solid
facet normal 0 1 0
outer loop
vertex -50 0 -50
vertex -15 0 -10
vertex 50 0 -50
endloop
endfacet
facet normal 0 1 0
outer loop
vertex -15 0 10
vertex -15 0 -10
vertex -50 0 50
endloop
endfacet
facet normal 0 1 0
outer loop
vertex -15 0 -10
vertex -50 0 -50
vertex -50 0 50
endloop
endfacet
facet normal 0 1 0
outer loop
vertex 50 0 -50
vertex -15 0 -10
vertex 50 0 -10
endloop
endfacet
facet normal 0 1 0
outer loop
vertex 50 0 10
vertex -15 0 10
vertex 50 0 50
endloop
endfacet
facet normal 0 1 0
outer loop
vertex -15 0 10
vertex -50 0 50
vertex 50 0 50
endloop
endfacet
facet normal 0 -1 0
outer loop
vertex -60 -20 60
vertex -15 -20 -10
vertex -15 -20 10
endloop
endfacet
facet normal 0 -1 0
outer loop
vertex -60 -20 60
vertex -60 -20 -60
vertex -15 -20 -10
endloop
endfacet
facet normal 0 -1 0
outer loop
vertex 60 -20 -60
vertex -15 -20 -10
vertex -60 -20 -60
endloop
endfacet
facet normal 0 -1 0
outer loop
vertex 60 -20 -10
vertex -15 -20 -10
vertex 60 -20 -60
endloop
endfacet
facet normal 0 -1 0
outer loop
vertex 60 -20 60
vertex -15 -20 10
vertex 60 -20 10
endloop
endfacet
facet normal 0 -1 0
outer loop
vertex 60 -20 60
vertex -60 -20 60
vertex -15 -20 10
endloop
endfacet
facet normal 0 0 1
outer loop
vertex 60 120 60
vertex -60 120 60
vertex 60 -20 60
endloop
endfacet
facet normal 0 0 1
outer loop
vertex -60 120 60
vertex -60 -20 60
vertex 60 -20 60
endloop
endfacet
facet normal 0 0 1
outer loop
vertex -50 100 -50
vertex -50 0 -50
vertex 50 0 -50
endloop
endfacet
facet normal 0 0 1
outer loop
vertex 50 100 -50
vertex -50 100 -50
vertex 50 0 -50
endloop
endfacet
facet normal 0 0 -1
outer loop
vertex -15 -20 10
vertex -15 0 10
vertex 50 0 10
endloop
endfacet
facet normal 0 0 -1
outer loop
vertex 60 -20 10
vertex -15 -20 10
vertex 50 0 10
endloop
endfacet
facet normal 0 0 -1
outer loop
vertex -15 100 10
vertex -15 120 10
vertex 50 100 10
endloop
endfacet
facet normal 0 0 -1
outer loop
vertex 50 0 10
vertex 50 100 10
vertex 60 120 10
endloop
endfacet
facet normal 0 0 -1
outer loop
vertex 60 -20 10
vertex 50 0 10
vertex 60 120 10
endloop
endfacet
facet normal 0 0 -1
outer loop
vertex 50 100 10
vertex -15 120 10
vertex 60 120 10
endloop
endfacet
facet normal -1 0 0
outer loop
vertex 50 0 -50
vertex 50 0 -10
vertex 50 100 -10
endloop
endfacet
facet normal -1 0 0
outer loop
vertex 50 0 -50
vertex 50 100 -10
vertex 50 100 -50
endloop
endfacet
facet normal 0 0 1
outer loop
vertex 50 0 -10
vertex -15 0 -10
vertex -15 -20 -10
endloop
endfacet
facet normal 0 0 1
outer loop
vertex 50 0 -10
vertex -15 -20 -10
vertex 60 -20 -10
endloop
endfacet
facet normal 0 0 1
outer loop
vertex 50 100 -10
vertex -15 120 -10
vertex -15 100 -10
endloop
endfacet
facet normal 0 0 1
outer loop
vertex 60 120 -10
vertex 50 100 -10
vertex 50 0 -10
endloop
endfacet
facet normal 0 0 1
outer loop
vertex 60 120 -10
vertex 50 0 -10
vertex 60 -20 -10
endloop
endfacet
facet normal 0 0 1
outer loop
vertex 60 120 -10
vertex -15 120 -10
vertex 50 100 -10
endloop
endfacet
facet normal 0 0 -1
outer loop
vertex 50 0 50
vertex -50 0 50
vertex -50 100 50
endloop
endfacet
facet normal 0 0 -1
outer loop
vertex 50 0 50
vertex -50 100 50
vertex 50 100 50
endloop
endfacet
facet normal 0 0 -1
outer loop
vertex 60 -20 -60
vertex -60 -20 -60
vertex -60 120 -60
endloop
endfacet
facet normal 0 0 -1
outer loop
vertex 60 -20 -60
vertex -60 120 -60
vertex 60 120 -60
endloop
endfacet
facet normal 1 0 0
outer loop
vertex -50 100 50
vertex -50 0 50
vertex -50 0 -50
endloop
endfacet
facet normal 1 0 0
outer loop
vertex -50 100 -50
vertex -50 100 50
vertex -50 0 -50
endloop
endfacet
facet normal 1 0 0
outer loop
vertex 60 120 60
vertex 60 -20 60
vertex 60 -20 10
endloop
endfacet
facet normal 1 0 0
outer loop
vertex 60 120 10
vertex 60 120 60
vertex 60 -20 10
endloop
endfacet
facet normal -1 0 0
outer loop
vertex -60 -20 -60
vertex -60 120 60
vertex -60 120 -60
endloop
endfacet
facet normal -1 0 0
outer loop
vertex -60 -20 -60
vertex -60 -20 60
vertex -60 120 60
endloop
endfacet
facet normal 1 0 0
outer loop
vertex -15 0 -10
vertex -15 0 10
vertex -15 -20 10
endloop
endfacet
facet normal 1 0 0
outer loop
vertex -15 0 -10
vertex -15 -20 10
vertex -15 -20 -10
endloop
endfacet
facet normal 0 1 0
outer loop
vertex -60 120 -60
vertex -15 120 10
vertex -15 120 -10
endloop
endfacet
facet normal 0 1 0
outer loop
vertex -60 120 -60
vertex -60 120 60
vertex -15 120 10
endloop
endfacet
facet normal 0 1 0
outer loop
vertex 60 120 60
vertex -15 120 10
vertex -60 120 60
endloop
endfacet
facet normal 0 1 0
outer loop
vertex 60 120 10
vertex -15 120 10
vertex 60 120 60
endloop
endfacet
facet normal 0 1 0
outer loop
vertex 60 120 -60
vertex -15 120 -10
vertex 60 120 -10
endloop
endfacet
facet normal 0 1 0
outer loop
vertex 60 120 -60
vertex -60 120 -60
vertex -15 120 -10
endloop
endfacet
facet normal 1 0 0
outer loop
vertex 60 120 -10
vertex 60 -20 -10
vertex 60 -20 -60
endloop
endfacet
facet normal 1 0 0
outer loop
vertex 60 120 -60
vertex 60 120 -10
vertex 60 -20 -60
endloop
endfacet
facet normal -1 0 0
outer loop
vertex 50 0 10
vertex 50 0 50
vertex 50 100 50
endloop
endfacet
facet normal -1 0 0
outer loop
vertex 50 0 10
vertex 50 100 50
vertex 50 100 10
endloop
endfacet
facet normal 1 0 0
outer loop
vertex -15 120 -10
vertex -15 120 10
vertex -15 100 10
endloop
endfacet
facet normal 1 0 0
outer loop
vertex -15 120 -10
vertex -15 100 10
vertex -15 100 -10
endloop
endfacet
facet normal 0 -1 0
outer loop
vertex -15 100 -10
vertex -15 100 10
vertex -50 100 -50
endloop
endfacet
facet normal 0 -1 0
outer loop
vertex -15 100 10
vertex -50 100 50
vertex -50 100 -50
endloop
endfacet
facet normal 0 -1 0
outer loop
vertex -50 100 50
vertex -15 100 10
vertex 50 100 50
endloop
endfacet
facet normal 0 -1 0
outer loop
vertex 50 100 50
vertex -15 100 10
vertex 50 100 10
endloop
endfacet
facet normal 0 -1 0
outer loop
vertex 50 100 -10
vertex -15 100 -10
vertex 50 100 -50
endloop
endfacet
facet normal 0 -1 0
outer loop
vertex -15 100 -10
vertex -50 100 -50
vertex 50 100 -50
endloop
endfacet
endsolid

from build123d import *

# Parameters (mm, degrees)
SKETCH2_W           = 120
SKETCH2_H           = 120
SKETCH2_W_2         = 100
SKETCH2_H_2         = 100
BOSS_EXTRUDE1_DEPTH = 100
SKETCH3_W           = 120
SKETCH3_H           = 120
BOSS_EXTRUDE2_DEPTH = 20
SKETCH4_W           = 120
SKETCH4_H           = 120
BOSS_EXTRUDE3_DEPTH = 20
SKETCH5_W           = 75
SKETCH5_H           = 20
CUT_EXTRUDE1_DEPTH  = 150


with BuildPart() as part:
    # Sketch2 → Boss-Extrude1 (new body)
    with BuildSketch(Plane(origin=(0, 0, 0), x_dir=(1, 0, 0), z_dir=(0, 1, 0))):
        Rectangle(SKETCH2_W, SKETCH2_H)
        Rectangle(SKETCH2_W_2, SKETCH2_H_2, mode=Mode.SUBTRACT)
    extrude(amount=BOSS_EXTRUDE1_DEPTH)

    # Sketch3 → Boss-Extrude2 (add)
    with BuildSketch(Plane.XZ):
        Rectangle(SKETCH3_W, SKETCH3_H)
    extrude(amount=BOSS_EXTRUDE2_DEPTH)

    # Sketch4 → Boss-Extrude3 (add)
    with BuildSketch(Plane(origin=(0, 100, 0), x_dir=(1, 0, 0), z_dir=(0, 1, 0))):
        Rectangle(SKETCH4_W, SKETCH4_H)
    extrude(amount=BOSS_EXTRUDE3_DEPTH)

    # Sketch5 → Cut-Extrude1 (cut)
    with BuildSketch(Plane(origin=(0, 120, 0), x_dir=(1, 0, 0), z_dir=(0, 1, 0))):
        with Locations((22.5, 0)):
            Rectangle(SKETCH5_W, SKETCH5_H)
    extrude(amount=-CUT_EXTRUDE1_DEPTH, mode=Mode.SUBTRACT)


solid = part.part
